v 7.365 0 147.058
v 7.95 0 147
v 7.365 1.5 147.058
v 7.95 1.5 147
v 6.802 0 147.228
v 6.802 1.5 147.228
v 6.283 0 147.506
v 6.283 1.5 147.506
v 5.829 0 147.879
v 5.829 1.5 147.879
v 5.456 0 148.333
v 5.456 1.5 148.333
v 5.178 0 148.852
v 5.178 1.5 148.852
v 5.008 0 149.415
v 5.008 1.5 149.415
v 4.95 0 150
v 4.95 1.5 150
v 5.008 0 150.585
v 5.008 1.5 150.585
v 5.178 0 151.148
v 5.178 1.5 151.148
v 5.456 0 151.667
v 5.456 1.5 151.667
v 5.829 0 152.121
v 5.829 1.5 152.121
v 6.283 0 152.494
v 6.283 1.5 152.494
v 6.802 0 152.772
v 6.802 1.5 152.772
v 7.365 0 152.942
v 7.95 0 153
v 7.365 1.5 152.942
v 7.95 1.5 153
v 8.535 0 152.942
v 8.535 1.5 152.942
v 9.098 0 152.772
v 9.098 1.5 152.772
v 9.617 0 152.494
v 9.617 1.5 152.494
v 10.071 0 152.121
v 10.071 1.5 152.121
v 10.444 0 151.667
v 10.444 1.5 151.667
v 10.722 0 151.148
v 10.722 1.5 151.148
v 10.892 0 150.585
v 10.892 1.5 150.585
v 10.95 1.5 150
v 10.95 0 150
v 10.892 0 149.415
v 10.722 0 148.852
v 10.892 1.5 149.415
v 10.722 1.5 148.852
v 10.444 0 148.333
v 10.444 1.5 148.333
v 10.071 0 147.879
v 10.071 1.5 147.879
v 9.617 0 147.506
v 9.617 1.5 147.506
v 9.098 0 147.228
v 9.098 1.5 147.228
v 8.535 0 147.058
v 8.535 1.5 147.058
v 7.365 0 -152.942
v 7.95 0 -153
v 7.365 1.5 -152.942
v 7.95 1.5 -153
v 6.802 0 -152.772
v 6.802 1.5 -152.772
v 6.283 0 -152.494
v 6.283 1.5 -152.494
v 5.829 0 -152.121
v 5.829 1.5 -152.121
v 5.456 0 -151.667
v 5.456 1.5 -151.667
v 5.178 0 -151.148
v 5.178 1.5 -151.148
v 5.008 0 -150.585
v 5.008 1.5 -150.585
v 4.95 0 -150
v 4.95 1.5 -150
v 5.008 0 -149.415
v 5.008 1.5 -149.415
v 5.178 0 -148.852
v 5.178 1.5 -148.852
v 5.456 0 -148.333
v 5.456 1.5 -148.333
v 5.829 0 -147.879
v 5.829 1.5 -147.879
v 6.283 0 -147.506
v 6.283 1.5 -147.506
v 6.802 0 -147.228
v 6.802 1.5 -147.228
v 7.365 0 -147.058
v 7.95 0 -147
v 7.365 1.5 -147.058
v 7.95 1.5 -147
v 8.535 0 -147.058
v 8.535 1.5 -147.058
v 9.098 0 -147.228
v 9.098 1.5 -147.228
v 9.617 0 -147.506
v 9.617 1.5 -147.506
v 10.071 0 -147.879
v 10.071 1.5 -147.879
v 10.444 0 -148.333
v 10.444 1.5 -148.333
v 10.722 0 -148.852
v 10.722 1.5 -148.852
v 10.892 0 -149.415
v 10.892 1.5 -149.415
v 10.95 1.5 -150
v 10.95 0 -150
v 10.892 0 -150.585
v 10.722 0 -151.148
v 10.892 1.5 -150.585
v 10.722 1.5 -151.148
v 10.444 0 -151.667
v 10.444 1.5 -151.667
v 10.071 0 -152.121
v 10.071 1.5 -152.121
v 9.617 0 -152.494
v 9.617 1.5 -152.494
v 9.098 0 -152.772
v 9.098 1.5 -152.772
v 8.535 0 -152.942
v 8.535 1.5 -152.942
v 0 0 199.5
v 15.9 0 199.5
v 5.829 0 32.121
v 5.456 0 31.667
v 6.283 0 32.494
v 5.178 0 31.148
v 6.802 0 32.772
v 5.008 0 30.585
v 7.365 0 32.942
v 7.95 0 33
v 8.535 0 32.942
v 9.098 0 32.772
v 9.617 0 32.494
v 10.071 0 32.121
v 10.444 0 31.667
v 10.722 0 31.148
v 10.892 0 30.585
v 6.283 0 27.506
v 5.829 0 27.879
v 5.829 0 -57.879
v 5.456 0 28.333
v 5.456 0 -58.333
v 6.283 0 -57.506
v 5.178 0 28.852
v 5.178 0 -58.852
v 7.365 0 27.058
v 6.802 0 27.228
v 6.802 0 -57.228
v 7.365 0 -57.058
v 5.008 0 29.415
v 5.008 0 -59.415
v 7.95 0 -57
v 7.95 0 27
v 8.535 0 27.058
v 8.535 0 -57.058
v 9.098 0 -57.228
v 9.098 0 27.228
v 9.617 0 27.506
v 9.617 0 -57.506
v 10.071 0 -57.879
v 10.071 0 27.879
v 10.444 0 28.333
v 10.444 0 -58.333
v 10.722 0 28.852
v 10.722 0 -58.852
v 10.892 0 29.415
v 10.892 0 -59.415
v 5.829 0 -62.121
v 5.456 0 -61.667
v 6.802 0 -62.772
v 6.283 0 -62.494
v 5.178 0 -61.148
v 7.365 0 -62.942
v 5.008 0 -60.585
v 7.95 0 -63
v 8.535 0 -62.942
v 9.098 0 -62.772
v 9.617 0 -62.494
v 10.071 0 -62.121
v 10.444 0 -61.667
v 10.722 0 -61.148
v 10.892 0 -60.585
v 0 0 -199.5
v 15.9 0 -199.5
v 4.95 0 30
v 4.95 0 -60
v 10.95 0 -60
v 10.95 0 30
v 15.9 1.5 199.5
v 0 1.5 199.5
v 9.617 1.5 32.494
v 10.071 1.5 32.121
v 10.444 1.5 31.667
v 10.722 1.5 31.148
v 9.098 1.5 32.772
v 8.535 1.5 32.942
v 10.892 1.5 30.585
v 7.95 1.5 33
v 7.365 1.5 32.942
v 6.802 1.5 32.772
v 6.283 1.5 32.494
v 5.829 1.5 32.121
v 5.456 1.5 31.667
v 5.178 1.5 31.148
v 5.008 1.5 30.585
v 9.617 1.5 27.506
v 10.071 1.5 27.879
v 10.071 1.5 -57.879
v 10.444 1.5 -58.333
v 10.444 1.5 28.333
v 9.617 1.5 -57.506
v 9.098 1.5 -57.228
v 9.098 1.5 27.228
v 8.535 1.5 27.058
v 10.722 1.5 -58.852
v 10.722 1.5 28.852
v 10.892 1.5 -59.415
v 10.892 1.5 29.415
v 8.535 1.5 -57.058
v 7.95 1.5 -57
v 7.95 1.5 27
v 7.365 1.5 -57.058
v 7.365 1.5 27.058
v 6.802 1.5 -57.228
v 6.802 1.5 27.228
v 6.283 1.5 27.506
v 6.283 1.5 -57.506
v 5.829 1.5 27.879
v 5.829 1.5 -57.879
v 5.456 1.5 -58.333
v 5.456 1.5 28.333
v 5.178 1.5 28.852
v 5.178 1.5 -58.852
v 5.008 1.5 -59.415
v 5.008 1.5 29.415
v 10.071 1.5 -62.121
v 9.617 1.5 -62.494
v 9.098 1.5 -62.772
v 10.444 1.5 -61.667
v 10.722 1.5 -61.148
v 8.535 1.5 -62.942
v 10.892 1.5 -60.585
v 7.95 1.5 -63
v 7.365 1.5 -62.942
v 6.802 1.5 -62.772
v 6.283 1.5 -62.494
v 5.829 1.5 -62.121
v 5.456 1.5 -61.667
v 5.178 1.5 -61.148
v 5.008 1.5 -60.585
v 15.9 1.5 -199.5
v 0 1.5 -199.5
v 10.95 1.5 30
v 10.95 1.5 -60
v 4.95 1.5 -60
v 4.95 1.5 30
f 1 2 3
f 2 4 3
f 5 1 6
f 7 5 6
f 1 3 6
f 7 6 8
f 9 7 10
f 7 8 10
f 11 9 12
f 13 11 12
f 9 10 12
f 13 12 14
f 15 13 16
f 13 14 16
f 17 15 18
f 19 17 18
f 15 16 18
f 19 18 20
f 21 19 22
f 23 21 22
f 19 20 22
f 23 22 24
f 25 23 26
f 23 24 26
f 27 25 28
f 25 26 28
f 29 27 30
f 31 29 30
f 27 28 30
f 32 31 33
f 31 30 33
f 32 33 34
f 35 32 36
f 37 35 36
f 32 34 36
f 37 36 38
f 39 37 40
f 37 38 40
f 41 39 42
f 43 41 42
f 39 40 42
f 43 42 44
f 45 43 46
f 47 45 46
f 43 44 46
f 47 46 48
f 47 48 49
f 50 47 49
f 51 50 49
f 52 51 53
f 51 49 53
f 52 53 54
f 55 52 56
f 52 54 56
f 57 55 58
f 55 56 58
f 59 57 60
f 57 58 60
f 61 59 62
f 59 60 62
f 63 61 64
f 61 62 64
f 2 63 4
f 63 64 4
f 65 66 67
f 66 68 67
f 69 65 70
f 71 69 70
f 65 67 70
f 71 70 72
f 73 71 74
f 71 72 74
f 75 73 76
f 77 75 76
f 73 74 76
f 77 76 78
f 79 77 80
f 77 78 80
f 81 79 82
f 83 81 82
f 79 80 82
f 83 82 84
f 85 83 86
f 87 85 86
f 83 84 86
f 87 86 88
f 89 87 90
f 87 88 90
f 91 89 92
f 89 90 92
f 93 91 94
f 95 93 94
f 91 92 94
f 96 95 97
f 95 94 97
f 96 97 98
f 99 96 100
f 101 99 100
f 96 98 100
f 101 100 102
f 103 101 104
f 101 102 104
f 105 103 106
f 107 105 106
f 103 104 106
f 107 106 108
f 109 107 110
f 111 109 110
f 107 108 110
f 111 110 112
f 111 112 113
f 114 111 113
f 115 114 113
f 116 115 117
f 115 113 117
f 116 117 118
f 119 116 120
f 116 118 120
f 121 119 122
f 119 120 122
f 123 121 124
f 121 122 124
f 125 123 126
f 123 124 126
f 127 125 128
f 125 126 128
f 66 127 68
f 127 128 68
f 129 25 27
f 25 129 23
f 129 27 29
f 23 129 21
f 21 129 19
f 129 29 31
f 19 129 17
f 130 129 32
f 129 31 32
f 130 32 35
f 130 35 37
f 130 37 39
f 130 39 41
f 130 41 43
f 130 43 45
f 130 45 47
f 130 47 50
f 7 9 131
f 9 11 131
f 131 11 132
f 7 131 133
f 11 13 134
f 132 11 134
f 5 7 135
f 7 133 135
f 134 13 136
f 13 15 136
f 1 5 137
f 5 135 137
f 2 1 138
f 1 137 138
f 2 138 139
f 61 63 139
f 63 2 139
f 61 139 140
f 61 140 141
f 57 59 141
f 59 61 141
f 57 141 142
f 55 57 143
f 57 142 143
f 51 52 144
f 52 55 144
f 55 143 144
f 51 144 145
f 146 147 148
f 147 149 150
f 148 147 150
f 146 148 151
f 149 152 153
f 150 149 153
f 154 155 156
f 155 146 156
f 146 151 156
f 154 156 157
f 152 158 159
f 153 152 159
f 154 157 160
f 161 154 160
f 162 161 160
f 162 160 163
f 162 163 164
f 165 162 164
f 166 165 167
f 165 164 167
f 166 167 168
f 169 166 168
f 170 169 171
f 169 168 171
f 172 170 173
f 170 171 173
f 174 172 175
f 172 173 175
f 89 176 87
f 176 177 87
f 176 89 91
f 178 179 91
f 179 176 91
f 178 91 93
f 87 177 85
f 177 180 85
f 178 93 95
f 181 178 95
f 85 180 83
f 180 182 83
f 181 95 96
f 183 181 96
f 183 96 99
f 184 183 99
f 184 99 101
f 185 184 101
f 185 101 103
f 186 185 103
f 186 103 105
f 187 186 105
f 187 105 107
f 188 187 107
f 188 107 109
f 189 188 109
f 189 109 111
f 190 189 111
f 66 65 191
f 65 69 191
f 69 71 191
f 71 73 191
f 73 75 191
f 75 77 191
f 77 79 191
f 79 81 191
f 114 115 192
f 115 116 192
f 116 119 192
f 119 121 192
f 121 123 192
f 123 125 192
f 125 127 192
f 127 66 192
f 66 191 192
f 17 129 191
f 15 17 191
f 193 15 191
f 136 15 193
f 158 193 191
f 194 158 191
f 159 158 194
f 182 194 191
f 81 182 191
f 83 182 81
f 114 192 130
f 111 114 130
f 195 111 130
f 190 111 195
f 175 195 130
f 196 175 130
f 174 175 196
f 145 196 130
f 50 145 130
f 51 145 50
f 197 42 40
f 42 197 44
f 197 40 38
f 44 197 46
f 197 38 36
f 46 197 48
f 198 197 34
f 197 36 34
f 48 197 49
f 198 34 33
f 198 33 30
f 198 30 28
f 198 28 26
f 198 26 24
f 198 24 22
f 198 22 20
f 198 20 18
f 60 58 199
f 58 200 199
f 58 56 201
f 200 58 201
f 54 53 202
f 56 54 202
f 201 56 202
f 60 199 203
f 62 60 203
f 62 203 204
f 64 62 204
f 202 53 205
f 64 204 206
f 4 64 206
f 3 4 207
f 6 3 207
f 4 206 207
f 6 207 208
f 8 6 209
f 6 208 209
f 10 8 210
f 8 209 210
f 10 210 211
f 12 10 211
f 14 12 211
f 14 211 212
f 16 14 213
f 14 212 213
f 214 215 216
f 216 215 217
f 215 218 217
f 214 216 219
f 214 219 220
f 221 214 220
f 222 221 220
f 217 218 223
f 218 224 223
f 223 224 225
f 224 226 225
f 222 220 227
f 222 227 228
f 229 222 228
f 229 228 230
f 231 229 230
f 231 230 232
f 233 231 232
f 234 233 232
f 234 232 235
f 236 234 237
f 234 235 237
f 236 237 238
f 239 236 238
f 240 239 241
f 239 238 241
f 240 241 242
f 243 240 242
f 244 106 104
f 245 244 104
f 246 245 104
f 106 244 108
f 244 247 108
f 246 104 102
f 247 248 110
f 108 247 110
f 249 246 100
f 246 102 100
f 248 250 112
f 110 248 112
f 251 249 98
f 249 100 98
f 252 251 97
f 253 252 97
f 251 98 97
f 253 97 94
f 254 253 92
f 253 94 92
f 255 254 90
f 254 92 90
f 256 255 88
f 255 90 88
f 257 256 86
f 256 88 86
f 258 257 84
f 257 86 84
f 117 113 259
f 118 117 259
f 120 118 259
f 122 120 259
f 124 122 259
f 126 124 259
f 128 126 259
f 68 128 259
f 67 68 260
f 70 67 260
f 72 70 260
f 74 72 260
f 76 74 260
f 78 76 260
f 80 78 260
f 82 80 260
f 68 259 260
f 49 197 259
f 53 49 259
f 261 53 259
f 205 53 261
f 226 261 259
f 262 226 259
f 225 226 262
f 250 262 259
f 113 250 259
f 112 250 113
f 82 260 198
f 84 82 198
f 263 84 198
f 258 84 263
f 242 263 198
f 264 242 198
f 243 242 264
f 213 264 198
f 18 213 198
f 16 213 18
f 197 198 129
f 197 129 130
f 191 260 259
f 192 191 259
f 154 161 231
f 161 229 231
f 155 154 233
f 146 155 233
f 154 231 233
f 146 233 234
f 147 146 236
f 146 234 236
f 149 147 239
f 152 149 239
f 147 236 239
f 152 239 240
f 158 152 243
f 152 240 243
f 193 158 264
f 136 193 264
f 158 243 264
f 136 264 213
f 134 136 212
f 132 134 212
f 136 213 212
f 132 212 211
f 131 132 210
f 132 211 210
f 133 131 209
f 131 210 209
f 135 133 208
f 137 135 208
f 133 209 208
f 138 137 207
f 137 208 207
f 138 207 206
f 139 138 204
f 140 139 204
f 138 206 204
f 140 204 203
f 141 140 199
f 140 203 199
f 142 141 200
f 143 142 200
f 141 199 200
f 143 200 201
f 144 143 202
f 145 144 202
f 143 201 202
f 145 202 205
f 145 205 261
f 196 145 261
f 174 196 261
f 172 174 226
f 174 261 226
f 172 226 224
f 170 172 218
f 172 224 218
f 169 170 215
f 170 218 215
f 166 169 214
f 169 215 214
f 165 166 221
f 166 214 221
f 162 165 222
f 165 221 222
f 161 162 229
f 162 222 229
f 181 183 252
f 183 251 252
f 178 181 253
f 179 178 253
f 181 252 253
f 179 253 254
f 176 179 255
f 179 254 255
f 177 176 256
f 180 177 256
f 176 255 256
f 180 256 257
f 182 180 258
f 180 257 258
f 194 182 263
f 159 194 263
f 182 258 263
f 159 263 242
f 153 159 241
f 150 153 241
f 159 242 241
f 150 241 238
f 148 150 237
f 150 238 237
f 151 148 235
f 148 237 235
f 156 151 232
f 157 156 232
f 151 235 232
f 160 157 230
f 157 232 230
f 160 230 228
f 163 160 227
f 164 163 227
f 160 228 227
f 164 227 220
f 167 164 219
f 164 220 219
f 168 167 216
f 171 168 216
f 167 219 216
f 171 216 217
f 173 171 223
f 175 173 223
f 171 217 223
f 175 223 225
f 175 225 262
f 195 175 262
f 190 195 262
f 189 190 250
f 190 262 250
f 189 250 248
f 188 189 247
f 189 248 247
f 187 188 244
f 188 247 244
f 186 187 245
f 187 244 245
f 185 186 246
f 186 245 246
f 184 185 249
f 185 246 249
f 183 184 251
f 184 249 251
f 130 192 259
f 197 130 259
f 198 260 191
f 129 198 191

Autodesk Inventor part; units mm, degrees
ref_plane "YZ Plane" through (0, 0, 0) normal (1, 0, 0) x (0, 1, 0)
ref_plane "XZ Plane" through (0, 0, 0) normal (0, 1, 0) x (-1, 0, 0)
ref_plane "XY Plane" through (0, 0, 0) normal (0, 0, 1) x (1, 0, 0)
sketch "Szkic1" plane through (0, 0, 0) normal (0, 0, 1) x (1, 0, 0)
  line L0 (0, 0) -> (15.9, 0)
  line L1 (15.9, 0) -> (15.9, 1.5)
  line L2 (15.9, 1.5) -> (0, 1.5)
  line L3 (0, 1.5) -> (0, 0)
  dimension "d0" = 15.9
  dimension "d1" = 1.5
extrude "Wyciągnięcie proste1" add sketch "Szkic1" along normal mid plane 399
sketch "Szkic2" plane through (0, 0, 0) normal (0, 1, 0) x (-1, 0, 0)
  line L0 (0, -199.5) -> (-15.9, -199.5) construction
  line L1 (-7.95, -199.5) -> (-7.95, -178.6885) construction
  line L2 (-15.9, 199.5) -> (0, 199.5) projected
  point P0 (0, 0)
  point P1 (-7.95, -150)
  point P2 (-7.95, -60)
  point P3 (-7.95, 30)
  point P4 (-7.95, 150)
  dimension "d4" = 49.5
  dimension "d5" = 90
  dimension "d6" = 49.5
  dimension "d7" = 90
hole "Otwór1" at (7.95, 0, -150) at (7.95, 0, -60) at (7.95, 0, 30) at (7.95, 0, 150) direction (0, 1, 0) diameter 6 end through all
properties part number "Listwa_oparcia" material "Polistyren"
